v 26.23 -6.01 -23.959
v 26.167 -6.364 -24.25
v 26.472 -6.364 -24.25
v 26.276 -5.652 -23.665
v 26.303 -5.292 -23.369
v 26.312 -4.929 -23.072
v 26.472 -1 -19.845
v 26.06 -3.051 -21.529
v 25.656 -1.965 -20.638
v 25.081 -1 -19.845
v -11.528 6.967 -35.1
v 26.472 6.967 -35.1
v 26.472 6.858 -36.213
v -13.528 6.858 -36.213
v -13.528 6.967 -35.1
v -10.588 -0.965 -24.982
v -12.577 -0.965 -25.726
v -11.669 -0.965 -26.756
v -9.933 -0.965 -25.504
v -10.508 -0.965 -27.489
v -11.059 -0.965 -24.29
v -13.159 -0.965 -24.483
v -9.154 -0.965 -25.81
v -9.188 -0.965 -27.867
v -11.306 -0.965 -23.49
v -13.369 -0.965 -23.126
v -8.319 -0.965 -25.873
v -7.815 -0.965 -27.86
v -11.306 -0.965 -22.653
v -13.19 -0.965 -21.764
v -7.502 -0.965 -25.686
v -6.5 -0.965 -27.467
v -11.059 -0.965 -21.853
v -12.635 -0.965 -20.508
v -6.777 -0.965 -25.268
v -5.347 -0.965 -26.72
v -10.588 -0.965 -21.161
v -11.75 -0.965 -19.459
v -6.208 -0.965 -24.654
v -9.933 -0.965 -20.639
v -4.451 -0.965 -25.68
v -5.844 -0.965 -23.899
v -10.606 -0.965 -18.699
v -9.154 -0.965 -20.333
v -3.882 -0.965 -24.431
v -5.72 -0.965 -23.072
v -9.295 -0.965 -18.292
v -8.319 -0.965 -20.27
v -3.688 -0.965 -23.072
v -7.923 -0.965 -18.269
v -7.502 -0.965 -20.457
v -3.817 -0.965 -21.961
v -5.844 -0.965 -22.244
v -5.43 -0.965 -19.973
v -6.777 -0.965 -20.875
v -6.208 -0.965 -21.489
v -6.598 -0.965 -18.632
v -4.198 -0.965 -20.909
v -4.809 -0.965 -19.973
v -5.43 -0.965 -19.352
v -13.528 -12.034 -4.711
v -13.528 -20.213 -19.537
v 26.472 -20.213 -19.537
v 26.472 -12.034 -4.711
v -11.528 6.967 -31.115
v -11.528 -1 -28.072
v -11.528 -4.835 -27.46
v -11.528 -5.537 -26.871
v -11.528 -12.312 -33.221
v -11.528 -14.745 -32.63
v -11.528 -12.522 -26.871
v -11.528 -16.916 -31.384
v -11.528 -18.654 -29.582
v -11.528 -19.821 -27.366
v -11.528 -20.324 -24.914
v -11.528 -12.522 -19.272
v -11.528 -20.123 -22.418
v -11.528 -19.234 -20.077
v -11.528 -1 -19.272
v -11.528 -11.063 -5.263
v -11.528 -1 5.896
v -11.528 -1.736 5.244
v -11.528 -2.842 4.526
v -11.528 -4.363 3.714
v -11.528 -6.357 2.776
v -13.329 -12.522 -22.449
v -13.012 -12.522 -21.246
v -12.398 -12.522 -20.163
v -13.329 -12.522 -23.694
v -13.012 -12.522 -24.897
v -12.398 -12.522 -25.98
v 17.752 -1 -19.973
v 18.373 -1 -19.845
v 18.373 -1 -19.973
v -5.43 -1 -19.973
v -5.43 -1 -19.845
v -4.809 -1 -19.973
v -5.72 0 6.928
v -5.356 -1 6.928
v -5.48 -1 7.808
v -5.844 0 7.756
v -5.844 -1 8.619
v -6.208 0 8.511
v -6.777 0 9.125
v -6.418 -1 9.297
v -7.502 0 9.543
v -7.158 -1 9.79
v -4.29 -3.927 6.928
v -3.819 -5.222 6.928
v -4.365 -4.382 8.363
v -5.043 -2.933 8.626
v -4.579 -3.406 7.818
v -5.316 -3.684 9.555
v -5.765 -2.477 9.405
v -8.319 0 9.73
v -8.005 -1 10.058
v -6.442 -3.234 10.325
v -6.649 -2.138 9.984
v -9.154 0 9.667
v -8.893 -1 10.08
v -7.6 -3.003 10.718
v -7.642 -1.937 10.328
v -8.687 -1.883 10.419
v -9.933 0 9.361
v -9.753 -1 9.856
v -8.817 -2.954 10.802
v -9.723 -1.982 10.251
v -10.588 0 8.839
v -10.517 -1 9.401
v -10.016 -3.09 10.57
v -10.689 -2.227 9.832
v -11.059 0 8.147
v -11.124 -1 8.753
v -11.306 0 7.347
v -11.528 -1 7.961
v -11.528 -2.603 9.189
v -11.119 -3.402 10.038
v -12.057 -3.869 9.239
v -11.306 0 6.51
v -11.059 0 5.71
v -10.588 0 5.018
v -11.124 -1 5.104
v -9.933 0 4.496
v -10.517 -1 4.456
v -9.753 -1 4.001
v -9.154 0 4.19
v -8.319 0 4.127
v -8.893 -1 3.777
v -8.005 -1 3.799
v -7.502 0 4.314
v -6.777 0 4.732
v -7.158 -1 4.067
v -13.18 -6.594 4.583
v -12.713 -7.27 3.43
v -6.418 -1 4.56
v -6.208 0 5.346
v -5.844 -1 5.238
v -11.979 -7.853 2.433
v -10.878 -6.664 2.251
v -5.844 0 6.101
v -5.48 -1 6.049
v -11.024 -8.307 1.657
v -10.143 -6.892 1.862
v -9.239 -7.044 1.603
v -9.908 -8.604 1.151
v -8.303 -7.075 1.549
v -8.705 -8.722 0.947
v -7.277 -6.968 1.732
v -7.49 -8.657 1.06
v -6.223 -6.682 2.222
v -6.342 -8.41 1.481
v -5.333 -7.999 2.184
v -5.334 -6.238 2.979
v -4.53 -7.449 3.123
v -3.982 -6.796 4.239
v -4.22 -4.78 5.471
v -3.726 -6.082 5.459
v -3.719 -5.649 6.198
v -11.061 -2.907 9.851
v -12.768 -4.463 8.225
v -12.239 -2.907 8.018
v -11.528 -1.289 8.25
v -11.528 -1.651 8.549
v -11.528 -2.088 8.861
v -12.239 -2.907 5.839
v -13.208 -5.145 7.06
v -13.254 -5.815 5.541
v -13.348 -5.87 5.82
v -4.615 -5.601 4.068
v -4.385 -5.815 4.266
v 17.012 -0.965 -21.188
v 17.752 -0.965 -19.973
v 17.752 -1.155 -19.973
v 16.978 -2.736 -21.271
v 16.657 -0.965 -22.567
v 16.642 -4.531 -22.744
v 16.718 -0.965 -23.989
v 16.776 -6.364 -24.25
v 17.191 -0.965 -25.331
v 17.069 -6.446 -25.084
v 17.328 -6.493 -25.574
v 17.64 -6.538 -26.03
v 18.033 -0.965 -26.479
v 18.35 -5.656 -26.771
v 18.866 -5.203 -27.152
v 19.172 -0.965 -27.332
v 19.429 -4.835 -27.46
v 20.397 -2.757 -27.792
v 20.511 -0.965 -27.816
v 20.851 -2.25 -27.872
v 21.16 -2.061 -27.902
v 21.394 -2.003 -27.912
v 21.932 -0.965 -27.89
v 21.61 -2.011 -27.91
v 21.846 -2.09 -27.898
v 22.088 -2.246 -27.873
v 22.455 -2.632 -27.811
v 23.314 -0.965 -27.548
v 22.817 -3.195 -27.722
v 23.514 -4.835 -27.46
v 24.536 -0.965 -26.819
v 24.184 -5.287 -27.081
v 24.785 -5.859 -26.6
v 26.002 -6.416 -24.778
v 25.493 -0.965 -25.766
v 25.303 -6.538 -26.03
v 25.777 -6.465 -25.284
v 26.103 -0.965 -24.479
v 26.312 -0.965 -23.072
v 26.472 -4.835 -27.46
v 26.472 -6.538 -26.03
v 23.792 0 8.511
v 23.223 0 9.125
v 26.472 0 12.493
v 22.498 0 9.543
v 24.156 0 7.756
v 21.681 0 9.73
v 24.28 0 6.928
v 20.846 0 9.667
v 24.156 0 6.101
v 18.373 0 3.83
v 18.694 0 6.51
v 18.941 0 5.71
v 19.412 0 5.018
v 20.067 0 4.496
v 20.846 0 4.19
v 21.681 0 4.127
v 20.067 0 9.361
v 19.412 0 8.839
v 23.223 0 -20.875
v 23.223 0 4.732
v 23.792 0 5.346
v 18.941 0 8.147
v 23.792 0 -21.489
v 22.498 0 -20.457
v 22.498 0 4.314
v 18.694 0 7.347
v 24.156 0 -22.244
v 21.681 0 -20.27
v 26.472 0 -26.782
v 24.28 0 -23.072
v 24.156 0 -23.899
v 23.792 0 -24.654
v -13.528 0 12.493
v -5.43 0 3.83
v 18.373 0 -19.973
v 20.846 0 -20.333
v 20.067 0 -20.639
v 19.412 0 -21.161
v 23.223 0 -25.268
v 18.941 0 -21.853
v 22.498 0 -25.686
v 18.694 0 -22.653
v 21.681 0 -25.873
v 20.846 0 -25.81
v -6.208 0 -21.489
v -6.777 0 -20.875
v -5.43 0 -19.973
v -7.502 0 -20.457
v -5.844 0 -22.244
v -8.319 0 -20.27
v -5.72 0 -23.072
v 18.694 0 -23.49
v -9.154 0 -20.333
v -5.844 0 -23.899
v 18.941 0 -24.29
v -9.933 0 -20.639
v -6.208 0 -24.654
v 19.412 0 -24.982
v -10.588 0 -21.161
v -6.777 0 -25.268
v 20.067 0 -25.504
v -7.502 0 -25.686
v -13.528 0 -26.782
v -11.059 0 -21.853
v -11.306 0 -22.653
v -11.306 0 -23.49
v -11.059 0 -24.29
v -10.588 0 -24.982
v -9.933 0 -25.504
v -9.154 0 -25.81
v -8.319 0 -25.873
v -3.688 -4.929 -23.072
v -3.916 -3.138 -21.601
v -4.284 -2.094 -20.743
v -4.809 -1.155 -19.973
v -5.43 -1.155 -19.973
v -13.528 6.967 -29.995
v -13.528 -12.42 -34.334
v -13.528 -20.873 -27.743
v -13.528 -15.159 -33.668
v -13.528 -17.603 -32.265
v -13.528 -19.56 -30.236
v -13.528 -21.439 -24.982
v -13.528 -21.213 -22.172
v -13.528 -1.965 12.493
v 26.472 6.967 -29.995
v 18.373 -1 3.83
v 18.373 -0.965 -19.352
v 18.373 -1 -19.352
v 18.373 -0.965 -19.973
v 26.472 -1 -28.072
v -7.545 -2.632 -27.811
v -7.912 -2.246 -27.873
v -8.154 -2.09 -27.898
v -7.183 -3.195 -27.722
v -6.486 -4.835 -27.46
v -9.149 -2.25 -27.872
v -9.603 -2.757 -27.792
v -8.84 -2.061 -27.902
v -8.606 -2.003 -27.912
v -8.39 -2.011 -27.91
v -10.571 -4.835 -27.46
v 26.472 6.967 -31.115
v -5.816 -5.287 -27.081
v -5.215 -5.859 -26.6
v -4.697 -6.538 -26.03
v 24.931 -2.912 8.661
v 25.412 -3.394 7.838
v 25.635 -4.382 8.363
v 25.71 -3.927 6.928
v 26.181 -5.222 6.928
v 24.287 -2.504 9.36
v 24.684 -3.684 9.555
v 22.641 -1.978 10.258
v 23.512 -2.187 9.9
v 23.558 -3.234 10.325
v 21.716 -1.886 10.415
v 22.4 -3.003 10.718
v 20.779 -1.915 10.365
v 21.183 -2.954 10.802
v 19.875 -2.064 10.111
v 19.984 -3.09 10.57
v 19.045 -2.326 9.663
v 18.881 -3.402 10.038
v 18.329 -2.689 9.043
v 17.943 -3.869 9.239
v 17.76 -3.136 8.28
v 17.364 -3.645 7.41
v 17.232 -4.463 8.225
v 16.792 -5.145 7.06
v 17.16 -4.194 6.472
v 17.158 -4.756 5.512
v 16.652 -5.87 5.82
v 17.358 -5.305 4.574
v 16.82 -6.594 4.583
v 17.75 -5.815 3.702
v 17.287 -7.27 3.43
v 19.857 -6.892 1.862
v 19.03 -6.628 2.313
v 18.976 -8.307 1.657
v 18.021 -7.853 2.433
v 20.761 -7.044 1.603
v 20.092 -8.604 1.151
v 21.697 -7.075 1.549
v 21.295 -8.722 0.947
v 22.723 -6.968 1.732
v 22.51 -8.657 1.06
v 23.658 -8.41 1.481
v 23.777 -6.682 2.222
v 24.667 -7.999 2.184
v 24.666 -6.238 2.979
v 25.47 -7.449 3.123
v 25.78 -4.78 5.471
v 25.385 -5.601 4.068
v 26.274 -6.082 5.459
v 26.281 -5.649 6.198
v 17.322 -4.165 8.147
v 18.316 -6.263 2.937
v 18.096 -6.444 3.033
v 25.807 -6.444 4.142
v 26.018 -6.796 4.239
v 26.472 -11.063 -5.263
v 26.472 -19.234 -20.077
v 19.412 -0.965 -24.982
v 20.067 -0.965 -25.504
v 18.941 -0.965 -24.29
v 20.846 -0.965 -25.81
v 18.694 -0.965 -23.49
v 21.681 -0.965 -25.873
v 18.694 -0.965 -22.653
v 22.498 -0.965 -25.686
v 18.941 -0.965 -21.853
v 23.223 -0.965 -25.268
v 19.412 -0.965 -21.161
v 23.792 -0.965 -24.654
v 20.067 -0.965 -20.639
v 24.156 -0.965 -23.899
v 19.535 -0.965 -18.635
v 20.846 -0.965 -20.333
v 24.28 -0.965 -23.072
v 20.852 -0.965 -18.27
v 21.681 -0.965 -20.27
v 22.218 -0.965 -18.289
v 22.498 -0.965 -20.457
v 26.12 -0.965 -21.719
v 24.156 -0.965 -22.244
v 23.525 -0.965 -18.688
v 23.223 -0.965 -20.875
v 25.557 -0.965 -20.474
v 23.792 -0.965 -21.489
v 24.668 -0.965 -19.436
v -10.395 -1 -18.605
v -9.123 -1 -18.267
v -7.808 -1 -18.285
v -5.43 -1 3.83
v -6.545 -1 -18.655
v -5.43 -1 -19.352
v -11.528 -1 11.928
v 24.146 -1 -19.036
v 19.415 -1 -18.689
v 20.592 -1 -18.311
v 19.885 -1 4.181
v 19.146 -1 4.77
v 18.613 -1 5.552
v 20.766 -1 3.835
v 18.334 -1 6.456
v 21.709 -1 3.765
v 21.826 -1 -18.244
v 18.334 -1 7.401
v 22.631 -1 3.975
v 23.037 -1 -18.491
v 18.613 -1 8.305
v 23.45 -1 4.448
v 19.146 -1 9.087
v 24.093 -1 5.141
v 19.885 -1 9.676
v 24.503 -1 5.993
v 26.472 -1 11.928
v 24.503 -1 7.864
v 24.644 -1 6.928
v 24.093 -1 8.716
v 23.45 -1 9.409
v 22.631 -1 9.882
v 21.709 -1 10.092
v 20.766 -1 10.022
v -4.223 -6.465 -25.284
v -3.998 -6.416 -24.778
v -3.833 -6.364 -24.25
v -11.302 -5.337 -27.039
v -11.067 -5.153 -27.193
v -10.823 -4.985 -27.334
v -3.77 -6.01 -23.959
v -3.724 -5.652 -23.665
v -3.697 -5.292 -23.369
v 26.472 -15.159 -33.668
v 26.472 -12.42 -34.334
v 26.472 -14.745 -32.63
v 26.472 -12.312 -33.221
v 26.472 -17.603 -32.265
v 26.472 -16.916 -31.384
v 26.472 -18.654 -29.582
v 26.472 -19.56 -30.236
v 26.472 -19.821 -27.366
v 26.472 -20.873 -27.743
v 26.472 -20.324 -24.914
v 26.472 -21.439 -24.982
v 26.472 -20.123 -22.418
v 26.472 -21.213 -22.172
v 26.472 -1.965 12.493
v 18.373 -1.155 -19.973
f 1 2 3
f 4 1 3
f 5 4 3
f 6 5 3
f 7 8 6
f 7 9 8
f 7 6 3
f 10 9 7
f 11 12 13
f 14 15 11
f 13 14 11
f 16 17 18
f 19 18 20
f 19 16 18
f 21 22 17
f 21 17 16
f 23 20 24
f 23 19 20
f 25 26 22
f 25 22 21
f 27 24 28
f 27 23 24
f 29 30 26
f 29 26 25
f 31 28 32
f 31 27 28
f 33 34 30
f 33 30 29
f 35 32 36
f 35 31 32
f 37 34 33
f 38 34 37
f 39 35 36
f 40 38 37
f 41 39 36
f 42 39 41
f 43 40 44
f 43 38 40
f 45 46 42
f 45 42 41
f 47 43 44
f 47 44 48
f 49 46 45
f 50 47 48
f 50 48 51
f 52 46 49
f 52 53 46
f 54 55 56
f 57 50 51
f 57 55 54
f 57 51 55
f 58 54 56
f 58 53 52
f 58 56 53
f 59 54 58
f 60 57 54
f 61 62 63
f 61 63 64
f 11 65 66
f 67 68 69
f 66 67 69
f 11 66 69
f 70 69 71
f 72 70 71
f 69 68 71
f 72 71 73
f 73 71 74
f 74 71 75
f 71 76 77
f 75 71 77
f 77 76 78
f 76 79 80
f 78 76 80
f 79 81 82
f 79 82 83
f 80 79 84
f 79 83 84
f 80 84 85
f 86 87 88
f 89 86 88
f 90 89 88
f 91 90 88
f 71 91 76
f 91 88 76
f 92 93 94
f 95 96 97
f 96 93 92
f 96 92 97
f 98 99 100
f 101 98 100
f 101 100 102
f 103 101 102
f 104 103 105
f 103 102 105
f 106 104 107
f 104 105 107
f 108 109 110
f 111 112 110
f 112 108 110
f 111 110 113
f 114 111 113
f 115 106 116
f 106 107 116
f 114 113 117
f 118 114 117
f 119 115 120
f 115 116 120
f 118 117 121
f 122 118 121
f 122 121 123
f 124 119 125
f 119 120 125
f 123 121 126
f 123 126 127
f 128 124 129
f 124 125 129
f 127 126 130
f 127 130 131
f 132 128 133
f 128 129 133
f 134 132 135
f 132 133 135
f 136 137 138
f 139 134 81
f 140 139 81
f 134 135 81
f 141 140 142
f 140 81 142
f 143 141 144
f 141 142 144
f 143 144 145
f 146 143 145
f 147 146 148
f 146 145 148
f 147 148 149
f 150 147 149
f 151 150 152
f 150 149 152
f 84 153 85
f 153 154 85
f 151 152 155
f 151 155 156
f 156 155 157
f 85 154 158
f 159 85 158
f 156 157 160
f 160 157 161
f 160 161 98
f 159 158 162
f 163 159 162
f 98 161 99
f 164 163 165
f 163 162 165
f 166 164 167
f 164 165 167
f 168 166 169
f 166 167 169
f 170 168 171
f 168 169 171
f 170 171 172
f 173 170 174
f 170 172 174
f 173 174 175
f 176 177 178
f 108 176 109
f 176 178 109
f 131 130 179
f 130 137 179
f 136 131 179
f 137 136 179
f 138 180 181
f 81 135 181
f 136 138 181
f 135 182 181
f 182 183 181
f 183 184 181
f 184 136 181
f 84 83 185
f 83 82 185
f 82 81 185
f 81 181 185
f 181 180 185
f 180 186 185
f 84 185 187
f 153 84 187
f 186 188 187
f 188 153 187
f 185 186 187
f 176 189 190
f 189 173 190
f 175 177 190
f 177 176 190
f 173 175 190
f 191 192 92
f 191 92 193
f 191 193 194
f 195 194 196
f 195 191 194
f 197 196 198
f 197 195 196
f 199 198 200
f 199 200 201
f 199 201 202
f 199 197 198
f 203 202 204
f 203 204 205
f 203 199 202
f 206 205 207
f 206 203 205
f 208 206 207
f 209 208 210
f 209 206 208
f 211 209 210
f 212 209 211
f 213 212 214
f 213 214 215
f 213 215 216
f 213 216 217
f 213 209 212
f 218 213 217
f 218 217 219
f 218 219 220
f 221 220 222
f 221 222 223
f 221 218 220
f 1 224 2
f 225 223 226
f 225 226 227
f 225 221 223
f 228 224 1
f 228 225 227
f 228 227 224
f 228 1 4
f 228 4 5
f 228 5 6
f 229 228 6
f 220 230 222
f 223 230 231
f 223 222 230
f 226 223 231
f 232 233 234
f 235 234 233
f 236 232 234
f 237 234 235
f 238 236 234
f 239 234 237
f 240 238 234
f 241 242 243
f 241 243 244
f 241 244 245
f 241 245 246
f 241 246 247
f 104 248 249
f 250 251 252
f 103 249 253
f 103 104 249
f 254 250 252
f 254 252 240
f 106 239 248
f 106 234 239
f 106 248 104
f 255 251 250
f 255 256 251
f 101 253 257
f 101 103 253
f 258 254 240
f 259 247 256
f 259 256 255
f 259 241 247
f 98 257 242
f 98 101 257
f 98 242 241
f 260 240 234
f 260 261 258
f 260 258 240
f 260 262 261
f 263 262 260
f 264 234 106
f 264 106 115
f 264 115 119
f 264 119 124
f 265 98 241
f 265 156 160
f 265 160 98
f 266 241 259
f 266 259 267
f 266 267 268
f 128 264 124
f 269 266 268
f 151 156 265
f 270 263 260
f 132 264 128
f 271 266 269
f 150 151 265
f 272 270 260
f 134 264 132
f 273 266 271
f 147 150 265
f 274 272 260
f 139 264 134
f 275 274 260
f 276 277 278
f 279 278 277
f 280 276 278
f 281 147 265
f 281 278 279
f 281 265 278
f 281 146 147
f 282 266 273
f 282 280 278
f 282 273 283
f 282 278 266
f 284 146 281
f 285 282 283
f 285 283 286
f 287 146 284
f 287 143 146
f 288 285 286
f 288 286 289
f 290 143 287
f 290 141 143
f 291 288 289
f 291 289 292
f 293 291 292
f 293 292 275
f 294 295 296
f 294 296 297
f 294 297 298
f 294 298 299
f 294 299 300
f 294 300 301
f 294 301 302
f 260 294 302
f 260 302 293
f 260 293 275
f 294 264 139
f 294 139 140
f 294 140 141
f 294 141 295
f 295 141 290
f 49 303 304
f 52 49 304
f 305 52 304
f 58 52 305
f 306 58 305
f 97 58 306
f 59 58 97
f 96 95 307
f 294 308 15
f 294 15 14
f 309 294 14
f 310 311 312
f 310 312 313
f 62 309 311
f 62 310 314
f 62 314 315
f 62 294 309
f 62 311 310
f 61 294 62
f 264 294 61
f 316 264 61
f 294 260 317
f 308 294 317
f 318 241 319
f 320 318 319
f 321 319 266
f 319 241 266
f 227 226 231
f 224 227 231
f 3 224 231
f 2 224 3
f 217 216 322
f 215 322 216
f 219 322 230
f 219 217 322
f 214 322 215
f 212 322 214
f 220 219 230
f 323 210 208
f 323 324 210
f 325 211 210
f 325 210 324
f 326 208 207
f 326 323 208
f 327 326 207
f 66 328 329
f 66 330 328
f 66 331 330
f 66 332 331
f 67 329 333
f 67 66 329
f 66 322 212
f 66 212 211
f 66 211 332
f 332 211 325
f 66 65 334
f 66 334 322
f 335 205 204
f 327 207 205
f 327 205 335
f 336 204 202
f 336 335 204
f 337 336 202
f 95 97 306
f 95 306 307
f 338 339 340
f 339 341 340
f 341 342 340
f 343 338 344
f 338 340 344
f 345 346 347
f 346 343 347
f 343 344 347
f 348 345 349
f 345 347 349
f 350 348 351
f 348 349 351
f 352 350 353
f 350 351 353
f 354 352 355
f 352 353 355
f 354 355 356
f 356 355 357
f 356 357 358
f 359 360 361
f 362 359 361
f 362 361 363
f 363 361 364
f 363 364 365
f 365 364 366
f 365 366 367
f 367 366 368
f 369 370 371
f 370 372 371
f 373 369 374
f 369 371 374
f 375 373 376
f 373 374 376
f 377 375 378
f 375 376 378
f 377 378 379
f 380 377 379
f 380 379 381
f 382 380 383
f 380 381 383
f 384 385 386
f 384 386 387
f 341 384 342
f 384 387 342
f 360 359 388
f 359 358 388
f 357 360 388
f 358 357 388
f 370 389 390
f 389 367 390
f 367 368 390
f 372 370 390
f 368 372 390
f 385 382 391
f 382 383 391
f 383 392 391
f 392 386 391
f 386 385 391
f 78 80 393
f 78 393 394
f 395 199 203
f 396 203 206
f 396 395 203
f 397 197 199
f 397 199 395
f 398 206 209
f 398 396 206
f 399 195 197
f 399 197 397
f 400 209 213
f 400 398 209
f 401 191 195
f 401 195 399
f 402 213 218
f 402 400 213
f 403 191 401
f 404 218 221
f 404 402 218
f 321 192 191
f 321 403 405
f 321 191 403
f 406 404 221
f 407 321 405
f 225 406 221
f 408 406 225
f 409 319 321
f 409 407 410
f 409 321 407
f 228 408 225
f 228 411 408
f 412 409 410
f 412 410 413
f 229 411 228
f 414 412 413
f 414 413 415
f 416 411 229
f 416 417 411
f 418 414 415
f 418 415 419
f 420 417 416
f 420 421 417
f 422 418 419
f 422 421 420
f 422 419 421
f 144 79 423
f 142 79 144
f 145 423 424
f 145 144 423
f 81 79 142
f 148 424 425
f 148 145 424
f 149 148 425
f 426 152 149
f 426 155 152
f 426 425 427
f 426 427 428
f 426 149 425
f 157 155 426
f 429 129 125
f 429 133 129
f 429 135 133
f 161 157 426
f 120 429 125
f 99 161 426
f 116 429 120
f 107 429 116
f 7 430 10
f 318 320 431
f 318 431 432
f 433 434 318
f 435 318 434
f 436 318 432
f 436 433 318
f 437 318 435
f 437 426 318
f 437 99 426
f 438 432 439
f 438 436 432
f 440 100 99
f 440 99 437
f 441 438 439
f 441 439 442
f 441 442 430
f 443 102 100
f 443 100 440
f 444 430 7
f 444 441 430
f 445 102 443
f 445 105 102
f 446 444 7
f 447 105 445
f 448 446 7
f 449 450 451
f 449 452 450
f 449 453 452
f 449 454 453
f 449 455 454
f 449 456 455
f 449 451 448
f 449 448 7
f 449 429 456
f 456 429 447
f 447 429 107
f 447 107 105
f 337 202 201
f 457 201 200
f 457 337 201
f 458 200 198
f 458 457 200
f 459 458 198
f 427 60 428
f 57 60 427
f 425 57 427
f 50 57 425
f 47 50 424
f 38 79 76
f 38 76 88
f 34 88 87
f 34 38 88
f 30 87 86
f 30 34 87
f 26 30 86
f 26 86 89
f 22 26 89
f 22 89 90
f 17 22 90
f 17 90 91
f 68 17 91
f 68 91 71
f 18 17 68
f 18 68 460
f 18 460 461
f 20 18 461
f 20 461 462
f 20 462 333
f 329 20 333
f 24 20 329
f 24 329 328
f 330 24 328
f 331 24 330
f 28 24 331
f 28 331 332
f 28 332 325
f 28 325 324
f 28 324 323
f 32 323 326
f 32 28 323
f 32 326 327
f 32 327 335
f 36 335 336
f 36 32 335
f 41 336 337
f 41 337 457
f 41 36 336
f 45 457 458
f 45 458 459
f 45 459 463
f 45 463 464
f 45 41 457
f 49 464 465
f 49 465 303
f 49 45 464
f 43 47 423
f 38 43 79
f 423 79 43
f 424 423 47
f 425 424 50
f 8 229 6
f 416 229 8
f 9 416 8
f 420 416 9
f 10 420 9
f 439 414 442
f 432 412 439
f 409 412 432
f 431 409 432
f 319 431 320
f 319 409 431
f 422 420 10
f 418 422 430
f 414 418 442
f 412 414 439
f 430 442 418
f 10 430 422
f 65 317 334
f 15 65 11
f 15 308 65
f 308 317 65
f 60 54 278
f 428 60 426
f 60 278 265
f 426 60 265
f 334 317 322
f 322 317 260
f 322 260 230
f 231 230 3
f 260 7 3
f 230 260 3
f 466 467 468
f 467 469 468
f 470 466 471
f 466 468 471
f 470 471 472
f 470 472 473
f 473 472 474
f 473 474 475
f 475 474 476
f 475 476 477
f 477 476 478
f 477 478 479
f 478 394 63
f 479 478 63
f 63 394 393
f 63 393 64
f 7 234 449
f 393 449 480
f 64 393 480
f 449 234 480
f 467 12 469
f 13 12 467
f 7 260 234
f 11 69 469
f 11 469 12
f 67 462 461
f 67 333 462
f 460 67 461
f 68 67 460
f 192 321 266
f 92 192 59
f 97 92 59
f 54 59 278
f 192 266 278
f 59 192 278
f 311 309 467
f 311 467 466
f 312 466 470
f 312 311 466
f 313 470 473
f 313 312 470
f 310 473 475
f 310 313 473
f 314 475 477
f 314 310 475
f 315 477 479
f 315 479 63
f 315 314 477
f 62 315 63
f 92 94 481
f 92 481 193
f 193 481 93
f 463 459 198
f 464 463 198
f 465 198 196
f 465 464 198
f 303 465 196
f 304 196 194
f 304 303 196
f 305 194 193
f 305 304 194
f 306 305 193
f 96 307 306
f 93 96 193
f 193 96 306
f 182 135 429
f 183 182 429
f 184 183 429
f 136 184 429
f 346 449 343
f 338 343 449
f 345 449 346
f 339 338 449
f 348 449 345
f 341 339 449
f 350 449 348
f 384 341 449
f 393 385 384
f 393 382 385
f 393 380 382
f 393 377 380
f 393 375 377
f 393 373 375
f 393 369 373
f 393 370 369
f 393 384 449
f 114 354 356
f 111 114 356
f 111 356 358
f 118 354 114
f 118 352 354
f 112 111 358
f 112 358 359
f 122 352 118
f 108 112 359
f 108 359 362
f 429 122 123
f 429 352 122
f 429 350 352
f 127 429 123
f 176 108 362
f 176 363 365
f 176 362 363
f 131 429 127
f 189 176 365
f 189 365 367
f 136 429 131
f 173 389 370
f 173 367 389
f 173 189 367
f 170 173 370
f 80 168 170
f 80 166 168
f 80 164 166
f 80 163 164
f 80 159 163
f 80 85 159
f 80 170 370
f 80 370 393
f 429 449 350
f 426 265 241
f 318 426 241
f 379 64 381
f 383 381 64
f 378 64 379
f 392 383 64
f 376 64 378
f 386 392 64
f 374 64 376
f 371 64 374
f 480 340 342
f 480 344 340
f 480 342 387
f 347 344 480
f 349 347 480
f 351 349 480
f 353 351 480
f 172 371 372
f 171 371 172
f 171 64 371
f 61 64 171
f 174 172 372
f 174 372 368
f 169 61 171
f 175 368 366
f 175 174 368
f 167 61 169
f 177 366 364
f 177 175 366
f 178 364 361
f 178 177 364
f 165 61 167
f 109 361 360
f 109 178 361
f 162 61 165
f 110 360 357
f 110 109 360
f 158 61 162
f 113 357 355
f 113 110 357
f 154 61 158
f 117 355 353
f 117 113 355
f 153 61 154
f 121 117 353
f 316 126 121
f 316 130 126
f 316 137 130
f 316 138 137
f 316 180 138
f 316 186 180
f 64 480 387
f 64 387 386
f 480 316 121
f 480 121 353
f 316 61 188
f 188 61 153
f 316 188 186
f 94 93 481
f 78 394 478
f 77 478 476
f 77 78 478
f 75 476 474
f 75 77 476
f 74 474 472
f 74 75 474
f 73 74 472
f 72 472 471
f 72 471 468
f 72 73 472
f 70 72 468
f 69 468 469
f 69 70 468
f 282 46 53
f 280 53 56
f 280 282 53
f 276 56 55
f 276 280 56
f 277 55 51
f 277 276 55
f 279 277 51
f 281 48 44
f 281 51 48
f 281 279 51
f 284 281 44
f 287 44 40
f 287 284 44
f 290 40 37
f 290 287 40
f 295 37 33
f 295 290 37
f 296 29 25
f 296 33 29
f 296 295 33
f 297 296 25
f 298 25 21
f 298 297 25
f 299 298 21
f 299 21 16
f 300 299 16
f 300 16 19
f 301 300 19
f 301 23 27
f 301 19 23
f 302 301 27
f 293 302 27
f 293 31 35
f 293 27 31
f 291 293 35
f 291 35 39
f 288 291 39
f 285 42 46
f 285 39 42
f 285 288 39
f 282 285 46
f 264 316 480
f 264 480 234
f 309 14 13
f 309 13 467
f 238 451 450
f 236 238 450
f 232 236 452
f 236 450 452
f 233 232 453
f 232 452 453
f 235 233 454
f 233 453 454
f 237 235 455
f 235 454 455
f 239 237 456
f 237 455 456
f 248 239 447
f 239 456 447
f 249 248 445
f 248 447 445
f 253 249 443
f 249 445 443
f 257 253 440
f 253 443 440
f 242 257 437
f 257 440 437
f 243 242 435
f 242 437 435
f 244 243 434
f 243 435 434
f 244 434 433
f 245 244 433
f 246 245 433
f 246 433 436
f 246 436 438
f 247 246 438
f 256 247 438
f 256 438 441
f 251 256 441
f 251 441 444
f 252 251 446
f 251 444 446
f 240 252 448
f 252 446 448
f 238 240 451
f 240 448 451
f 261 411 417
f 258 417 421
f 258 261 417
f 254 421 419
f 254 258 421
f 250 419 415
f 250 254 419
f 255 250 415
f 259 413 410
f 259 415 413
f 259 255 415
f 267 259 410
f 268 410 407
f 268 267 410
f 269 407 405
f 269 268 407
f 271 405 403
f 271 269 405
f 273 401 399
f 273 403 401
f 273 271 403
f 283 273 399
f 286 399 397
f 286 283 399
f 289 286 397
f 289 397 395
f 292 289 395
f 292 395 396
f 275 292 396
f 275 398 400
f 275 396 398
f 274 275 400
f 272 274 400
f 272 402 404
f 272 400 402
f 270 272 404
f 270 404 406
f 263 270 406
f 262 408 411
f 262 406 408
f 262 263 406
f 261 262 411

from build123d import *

# Parameters (mm, degrees)
F0_W     = 40
F0_H     = 40
F0_R     = 2.8088717
F0_R_2   = 2.8088682771
F1_DEPTH = 1
F3_DEPTH = 40
F4_DEPTH = 2
F5_DEPTH = 18.288
F5_TAPER = -20
F6_DEPTH = 9.0678
F6_TAPER = -20
F7_START = 0.9652
F7_DEPTH = 11.557


with BuildPart() as f1:
    # F0 (on Front) → F1 (new body)
    with BuildSketch(Plane.XZ):
        with Locations((6.4715254307, -8.0715133995)):
            Rectangle(F0_W, F0_H)
        with BuildLine():
            Line((-5.4296746384, -19.3524439185), (-5.4296746384, 3.8296866696))
            Line((-5.4296746384, 3.8296866696), (18.3727254998, 3.8296866696))
            Line((18.3727254998, 3.8296866696), (18.3727254998, -19.3524439185))
            ThreePointArc((18.3727254998, -19.3524439185), (23.524954992, -18.6877403838), (26.3123971307, -23.0715133995))
            ThreePointArc((26.3123971307, -23.0715133995), (19.8237237716, -27.6233029935), (17.7524559497, -19.9727134686))
            Line((17.7524559497, -19.9727134686), (-4.8094050884, -19.9727134686))
            ThreePointArc((-4.8094050884, -19.9727134686), (-3.9766849753, -21.4237117404), (-3.6876028693, -23.0715133995))
            ThreePointArc((-3.6876028693, -23.0715133995), (-12.912247585, -25.1249429608), (-5.4296746384, -19.3524439185))
        make_face(mode=Mode.SUBTRACT)
        with Locations((-8.5284745693, 6.9284866005)):
            Circle(F0_R, mode=Mode.SUBTRACT)
        with Locations((21.4715254307, 6.9284866005)):
            Circle(F0_R_2, mode=Mode.SUBTRACT)
        with BuildLine():
            Line((-5.4296746384, -19.9727134686), (-5.4296746384, -19.3524439185))
            ThreePointArc((-5.4296746384, -19.3524439185), (-12.912247585, -25.1249429608), (-3.6876028693, -23.0715133995))
            ThreePointArc((-3.6876028693, -23.0715133995), (-3.9766849753, -21.4237117404), (-4.8094050884, -19.9727134686))
            Line((-4.8094050884, -19.9727134686), (-5.4296746384, -19.9727134686))
        make_face()
        with Locations((-8.5284745693, -23.0715133995)):
            Circle(F0_R, mode=Mode.SUBTRACT)
        with BuildLine():
            ThreePointArc((26.3123971307, -23.0715133995), (23.524954992, -18.6877403838), (18.3727254998, -19.3524439185))
            Line((18.3727254998, -19.3524439185), (18.3727254998, -19.9727134686))
            Line((18.3727254998, -19.9727134686), (17.7524559497, -19.9727134686))
            ThreePointArc((17.7524559497, -19.9727134686), (19.8237237716, -27.6233029935), (26.3123971307, -23.0715133995))
        make_face()
        with Locations((21.4715254307, -23.0715133995)):
            Circle(F0_R, mode=Mode.SUBTRACT)
    extrude(amount=F1_DEPTH)

    # F2 (on face) → F3 (join)
    with BuildSketch(Plane(origin=(-13.5284745693, 0, 0), x_dir=(0, -1, 0), z_dir=(-1, 0, 0))):
        with BuildLine():
            Line((12.3116524944, -33.2211739971), (-6.9665359333, -35.1002924144))
            Line((-6.9665359333, -35.1002924144), (-6.8581130742, -36.2126205614))
            Line((-6.8581130742, -36.2126205614), (12.4200753535, -34.333502144))
            ThreePointArc((12.4200753535, -34.333502144), (20.3048000078, -29.0359972653), (20.2130647017, -19.5373644454))
            Line((20.2130647017, -19.5373644454), (12.0343582979, -4.7106706036))
            Line((12.0343582979, -4.7106706036), (1.9645202799, 12.4930484239))
            Line((1.9645202799, 12.4930484239), (0, 12.4930484239))
            Line((0, 12.4930484239), (0, 11.9284866005))
            Line((0, 11.9284866005), (1, 11.9284866005))
            Line((1, 11.9284866005), (11.0626462847, -5.2629457787))
            Line((11.0626462847, -5.2629457787), (19.2344762678, -20.0771737634))
            ThreePointArc((19.2344762678, -20.0771737634), (19.3159684051, -28.5151887743), (12.3116524944, -33.2211739971))
        make_face()
        Polygon((1, -19.8451913893), (1, -28.0715133995), (4.8349229619, -27.460442856), (6.5377627002, -26.0303480879), (6.3641844317, -24.2495797575), align=None)
        Polygon((-6.9665359333, -31.1145037413), (1, -28.0715133995), (0, -28.0715133995), (0, -26.7824456096), (-6.9665359333, -29.9953967333), align=None)
    extrude(amount=-F3_DEPTH)

    # F2 (on face) → F4 (join)
    with BuildSketch(Plane(origin=(-13.5284745693, 0, 0), x_dir=(0, -1, 0), z_dir=(-1, 0, 0))):
        with BuildLine():
            Line((4.8349229619, -27.460442856), (1, -28.0715133995))
            Line((1, -28.0715133995), (-6.9665359333, -31.1145037413))
            Line((-6.9665359333, -31.1145037413), (-6.9665359333, -35.1002924144))
            Line((-6.9665359333, -35.1002924144), (12.3116524944, -33.2211739971))
            ThreePointArc((12.3116524944, -33.2211739971), (19.3159684051, -28.5151887743), (19.2344762678, -20.0771737634))
            Line((19.2344762678, -20.0771737634), (11.0626462847, -5.2629457787))
            Line((11.0626462847, -5.2629457787), (1, 11.9284866005))
            Line((1, 11.9284866005), (1, -19.8451913893))
            Line((1, -19.8451913893), (6.3641844317, -24.2495797575))
            Line((6.3641844317, -24.2495797575), (6.5377627002, -26.0303480879))
            Line((6.5377627002, -26.0303480879), (4.8349229619, -27.460442856))
        make_face()
    extrude(amount=-F4_DEPTH)

    # F0 (on Front) → F5 (cut)
    with BuildSketch(Plane.XZ):
        with Locations((21.4715254307, 6.9284866005)):
            Circle(F0_R_2)
    extrude(amount=F5_DEPTH, taper=F5_TAPER, mode=Mode.SUBTRACT)

    # F0 (on Front) → F6 (cut)
    with BuildSketch(Plane.XZ):
        with Locations((-8.5284745693, 6.9284866005)):
            Circle(F0_R)
    extrude(amount=F6_DEPTH, taper=F6_TAPER, mode=Mode.SUBTRACT)

    # F0 (on Front) → F7 (cut)
    with BuildSketch(Plane.XZ.offset(F7_START)):
        with BuildLine():
            ThreePointArc((26.3123971307, -23.0715133995), (23.524954992, -18.6877403838), (18.3727254998, -19.3524439185))
            Line((18.3727254998, -19.3524439185), (18.3727254998, -19.9727134686))
            Line((18.3727254998, -19.9727134686), (17.7524559497, -19.9727134686))
            ThreePointArc((17.7524559497, -19.9727134686), (19.8237237716, -27.6233029935), (26.3123971307, -23.0715133995))
        make_face()
        with Locations((21.4715254307, -23.0715133995)):
            Circle(F0_R, mode=Mode.SUBTRACT)
        with BuildLine():
            Line((-5.4296746384, -19.9727134686), (-5.4296746384, -19.3524439185))
            ThreePointArc((-5.4296746384, -19.3524439185), (-12.912247585, -25.1249429608), (-3.6876028693, -23.0715133995))
            ThreePointArc((-3.6876028693, -23.0715133995), (-3.9766849753, -21.4237117404), (-4.8094050884, -19.9727134686))
            Line((-4.8094050884, -19.9727134686), (-5.4296746384, -19.9727134686))
        make_face()
        with Locations((-8.5284745693, -23.0715133995)):
            Circle(F0_R, mode=Mode.SUBTRACT)
        with Locations((21.4715254307, -23.0715133995)):
            Circle(F0_R)
        with Locations((-8.5284745693, -23.0715133995)):
            Circle(F0_R)
    extrude(amount=F7_DEPTH, mode=Mode.SUBTRACT)


solid = f1.part
